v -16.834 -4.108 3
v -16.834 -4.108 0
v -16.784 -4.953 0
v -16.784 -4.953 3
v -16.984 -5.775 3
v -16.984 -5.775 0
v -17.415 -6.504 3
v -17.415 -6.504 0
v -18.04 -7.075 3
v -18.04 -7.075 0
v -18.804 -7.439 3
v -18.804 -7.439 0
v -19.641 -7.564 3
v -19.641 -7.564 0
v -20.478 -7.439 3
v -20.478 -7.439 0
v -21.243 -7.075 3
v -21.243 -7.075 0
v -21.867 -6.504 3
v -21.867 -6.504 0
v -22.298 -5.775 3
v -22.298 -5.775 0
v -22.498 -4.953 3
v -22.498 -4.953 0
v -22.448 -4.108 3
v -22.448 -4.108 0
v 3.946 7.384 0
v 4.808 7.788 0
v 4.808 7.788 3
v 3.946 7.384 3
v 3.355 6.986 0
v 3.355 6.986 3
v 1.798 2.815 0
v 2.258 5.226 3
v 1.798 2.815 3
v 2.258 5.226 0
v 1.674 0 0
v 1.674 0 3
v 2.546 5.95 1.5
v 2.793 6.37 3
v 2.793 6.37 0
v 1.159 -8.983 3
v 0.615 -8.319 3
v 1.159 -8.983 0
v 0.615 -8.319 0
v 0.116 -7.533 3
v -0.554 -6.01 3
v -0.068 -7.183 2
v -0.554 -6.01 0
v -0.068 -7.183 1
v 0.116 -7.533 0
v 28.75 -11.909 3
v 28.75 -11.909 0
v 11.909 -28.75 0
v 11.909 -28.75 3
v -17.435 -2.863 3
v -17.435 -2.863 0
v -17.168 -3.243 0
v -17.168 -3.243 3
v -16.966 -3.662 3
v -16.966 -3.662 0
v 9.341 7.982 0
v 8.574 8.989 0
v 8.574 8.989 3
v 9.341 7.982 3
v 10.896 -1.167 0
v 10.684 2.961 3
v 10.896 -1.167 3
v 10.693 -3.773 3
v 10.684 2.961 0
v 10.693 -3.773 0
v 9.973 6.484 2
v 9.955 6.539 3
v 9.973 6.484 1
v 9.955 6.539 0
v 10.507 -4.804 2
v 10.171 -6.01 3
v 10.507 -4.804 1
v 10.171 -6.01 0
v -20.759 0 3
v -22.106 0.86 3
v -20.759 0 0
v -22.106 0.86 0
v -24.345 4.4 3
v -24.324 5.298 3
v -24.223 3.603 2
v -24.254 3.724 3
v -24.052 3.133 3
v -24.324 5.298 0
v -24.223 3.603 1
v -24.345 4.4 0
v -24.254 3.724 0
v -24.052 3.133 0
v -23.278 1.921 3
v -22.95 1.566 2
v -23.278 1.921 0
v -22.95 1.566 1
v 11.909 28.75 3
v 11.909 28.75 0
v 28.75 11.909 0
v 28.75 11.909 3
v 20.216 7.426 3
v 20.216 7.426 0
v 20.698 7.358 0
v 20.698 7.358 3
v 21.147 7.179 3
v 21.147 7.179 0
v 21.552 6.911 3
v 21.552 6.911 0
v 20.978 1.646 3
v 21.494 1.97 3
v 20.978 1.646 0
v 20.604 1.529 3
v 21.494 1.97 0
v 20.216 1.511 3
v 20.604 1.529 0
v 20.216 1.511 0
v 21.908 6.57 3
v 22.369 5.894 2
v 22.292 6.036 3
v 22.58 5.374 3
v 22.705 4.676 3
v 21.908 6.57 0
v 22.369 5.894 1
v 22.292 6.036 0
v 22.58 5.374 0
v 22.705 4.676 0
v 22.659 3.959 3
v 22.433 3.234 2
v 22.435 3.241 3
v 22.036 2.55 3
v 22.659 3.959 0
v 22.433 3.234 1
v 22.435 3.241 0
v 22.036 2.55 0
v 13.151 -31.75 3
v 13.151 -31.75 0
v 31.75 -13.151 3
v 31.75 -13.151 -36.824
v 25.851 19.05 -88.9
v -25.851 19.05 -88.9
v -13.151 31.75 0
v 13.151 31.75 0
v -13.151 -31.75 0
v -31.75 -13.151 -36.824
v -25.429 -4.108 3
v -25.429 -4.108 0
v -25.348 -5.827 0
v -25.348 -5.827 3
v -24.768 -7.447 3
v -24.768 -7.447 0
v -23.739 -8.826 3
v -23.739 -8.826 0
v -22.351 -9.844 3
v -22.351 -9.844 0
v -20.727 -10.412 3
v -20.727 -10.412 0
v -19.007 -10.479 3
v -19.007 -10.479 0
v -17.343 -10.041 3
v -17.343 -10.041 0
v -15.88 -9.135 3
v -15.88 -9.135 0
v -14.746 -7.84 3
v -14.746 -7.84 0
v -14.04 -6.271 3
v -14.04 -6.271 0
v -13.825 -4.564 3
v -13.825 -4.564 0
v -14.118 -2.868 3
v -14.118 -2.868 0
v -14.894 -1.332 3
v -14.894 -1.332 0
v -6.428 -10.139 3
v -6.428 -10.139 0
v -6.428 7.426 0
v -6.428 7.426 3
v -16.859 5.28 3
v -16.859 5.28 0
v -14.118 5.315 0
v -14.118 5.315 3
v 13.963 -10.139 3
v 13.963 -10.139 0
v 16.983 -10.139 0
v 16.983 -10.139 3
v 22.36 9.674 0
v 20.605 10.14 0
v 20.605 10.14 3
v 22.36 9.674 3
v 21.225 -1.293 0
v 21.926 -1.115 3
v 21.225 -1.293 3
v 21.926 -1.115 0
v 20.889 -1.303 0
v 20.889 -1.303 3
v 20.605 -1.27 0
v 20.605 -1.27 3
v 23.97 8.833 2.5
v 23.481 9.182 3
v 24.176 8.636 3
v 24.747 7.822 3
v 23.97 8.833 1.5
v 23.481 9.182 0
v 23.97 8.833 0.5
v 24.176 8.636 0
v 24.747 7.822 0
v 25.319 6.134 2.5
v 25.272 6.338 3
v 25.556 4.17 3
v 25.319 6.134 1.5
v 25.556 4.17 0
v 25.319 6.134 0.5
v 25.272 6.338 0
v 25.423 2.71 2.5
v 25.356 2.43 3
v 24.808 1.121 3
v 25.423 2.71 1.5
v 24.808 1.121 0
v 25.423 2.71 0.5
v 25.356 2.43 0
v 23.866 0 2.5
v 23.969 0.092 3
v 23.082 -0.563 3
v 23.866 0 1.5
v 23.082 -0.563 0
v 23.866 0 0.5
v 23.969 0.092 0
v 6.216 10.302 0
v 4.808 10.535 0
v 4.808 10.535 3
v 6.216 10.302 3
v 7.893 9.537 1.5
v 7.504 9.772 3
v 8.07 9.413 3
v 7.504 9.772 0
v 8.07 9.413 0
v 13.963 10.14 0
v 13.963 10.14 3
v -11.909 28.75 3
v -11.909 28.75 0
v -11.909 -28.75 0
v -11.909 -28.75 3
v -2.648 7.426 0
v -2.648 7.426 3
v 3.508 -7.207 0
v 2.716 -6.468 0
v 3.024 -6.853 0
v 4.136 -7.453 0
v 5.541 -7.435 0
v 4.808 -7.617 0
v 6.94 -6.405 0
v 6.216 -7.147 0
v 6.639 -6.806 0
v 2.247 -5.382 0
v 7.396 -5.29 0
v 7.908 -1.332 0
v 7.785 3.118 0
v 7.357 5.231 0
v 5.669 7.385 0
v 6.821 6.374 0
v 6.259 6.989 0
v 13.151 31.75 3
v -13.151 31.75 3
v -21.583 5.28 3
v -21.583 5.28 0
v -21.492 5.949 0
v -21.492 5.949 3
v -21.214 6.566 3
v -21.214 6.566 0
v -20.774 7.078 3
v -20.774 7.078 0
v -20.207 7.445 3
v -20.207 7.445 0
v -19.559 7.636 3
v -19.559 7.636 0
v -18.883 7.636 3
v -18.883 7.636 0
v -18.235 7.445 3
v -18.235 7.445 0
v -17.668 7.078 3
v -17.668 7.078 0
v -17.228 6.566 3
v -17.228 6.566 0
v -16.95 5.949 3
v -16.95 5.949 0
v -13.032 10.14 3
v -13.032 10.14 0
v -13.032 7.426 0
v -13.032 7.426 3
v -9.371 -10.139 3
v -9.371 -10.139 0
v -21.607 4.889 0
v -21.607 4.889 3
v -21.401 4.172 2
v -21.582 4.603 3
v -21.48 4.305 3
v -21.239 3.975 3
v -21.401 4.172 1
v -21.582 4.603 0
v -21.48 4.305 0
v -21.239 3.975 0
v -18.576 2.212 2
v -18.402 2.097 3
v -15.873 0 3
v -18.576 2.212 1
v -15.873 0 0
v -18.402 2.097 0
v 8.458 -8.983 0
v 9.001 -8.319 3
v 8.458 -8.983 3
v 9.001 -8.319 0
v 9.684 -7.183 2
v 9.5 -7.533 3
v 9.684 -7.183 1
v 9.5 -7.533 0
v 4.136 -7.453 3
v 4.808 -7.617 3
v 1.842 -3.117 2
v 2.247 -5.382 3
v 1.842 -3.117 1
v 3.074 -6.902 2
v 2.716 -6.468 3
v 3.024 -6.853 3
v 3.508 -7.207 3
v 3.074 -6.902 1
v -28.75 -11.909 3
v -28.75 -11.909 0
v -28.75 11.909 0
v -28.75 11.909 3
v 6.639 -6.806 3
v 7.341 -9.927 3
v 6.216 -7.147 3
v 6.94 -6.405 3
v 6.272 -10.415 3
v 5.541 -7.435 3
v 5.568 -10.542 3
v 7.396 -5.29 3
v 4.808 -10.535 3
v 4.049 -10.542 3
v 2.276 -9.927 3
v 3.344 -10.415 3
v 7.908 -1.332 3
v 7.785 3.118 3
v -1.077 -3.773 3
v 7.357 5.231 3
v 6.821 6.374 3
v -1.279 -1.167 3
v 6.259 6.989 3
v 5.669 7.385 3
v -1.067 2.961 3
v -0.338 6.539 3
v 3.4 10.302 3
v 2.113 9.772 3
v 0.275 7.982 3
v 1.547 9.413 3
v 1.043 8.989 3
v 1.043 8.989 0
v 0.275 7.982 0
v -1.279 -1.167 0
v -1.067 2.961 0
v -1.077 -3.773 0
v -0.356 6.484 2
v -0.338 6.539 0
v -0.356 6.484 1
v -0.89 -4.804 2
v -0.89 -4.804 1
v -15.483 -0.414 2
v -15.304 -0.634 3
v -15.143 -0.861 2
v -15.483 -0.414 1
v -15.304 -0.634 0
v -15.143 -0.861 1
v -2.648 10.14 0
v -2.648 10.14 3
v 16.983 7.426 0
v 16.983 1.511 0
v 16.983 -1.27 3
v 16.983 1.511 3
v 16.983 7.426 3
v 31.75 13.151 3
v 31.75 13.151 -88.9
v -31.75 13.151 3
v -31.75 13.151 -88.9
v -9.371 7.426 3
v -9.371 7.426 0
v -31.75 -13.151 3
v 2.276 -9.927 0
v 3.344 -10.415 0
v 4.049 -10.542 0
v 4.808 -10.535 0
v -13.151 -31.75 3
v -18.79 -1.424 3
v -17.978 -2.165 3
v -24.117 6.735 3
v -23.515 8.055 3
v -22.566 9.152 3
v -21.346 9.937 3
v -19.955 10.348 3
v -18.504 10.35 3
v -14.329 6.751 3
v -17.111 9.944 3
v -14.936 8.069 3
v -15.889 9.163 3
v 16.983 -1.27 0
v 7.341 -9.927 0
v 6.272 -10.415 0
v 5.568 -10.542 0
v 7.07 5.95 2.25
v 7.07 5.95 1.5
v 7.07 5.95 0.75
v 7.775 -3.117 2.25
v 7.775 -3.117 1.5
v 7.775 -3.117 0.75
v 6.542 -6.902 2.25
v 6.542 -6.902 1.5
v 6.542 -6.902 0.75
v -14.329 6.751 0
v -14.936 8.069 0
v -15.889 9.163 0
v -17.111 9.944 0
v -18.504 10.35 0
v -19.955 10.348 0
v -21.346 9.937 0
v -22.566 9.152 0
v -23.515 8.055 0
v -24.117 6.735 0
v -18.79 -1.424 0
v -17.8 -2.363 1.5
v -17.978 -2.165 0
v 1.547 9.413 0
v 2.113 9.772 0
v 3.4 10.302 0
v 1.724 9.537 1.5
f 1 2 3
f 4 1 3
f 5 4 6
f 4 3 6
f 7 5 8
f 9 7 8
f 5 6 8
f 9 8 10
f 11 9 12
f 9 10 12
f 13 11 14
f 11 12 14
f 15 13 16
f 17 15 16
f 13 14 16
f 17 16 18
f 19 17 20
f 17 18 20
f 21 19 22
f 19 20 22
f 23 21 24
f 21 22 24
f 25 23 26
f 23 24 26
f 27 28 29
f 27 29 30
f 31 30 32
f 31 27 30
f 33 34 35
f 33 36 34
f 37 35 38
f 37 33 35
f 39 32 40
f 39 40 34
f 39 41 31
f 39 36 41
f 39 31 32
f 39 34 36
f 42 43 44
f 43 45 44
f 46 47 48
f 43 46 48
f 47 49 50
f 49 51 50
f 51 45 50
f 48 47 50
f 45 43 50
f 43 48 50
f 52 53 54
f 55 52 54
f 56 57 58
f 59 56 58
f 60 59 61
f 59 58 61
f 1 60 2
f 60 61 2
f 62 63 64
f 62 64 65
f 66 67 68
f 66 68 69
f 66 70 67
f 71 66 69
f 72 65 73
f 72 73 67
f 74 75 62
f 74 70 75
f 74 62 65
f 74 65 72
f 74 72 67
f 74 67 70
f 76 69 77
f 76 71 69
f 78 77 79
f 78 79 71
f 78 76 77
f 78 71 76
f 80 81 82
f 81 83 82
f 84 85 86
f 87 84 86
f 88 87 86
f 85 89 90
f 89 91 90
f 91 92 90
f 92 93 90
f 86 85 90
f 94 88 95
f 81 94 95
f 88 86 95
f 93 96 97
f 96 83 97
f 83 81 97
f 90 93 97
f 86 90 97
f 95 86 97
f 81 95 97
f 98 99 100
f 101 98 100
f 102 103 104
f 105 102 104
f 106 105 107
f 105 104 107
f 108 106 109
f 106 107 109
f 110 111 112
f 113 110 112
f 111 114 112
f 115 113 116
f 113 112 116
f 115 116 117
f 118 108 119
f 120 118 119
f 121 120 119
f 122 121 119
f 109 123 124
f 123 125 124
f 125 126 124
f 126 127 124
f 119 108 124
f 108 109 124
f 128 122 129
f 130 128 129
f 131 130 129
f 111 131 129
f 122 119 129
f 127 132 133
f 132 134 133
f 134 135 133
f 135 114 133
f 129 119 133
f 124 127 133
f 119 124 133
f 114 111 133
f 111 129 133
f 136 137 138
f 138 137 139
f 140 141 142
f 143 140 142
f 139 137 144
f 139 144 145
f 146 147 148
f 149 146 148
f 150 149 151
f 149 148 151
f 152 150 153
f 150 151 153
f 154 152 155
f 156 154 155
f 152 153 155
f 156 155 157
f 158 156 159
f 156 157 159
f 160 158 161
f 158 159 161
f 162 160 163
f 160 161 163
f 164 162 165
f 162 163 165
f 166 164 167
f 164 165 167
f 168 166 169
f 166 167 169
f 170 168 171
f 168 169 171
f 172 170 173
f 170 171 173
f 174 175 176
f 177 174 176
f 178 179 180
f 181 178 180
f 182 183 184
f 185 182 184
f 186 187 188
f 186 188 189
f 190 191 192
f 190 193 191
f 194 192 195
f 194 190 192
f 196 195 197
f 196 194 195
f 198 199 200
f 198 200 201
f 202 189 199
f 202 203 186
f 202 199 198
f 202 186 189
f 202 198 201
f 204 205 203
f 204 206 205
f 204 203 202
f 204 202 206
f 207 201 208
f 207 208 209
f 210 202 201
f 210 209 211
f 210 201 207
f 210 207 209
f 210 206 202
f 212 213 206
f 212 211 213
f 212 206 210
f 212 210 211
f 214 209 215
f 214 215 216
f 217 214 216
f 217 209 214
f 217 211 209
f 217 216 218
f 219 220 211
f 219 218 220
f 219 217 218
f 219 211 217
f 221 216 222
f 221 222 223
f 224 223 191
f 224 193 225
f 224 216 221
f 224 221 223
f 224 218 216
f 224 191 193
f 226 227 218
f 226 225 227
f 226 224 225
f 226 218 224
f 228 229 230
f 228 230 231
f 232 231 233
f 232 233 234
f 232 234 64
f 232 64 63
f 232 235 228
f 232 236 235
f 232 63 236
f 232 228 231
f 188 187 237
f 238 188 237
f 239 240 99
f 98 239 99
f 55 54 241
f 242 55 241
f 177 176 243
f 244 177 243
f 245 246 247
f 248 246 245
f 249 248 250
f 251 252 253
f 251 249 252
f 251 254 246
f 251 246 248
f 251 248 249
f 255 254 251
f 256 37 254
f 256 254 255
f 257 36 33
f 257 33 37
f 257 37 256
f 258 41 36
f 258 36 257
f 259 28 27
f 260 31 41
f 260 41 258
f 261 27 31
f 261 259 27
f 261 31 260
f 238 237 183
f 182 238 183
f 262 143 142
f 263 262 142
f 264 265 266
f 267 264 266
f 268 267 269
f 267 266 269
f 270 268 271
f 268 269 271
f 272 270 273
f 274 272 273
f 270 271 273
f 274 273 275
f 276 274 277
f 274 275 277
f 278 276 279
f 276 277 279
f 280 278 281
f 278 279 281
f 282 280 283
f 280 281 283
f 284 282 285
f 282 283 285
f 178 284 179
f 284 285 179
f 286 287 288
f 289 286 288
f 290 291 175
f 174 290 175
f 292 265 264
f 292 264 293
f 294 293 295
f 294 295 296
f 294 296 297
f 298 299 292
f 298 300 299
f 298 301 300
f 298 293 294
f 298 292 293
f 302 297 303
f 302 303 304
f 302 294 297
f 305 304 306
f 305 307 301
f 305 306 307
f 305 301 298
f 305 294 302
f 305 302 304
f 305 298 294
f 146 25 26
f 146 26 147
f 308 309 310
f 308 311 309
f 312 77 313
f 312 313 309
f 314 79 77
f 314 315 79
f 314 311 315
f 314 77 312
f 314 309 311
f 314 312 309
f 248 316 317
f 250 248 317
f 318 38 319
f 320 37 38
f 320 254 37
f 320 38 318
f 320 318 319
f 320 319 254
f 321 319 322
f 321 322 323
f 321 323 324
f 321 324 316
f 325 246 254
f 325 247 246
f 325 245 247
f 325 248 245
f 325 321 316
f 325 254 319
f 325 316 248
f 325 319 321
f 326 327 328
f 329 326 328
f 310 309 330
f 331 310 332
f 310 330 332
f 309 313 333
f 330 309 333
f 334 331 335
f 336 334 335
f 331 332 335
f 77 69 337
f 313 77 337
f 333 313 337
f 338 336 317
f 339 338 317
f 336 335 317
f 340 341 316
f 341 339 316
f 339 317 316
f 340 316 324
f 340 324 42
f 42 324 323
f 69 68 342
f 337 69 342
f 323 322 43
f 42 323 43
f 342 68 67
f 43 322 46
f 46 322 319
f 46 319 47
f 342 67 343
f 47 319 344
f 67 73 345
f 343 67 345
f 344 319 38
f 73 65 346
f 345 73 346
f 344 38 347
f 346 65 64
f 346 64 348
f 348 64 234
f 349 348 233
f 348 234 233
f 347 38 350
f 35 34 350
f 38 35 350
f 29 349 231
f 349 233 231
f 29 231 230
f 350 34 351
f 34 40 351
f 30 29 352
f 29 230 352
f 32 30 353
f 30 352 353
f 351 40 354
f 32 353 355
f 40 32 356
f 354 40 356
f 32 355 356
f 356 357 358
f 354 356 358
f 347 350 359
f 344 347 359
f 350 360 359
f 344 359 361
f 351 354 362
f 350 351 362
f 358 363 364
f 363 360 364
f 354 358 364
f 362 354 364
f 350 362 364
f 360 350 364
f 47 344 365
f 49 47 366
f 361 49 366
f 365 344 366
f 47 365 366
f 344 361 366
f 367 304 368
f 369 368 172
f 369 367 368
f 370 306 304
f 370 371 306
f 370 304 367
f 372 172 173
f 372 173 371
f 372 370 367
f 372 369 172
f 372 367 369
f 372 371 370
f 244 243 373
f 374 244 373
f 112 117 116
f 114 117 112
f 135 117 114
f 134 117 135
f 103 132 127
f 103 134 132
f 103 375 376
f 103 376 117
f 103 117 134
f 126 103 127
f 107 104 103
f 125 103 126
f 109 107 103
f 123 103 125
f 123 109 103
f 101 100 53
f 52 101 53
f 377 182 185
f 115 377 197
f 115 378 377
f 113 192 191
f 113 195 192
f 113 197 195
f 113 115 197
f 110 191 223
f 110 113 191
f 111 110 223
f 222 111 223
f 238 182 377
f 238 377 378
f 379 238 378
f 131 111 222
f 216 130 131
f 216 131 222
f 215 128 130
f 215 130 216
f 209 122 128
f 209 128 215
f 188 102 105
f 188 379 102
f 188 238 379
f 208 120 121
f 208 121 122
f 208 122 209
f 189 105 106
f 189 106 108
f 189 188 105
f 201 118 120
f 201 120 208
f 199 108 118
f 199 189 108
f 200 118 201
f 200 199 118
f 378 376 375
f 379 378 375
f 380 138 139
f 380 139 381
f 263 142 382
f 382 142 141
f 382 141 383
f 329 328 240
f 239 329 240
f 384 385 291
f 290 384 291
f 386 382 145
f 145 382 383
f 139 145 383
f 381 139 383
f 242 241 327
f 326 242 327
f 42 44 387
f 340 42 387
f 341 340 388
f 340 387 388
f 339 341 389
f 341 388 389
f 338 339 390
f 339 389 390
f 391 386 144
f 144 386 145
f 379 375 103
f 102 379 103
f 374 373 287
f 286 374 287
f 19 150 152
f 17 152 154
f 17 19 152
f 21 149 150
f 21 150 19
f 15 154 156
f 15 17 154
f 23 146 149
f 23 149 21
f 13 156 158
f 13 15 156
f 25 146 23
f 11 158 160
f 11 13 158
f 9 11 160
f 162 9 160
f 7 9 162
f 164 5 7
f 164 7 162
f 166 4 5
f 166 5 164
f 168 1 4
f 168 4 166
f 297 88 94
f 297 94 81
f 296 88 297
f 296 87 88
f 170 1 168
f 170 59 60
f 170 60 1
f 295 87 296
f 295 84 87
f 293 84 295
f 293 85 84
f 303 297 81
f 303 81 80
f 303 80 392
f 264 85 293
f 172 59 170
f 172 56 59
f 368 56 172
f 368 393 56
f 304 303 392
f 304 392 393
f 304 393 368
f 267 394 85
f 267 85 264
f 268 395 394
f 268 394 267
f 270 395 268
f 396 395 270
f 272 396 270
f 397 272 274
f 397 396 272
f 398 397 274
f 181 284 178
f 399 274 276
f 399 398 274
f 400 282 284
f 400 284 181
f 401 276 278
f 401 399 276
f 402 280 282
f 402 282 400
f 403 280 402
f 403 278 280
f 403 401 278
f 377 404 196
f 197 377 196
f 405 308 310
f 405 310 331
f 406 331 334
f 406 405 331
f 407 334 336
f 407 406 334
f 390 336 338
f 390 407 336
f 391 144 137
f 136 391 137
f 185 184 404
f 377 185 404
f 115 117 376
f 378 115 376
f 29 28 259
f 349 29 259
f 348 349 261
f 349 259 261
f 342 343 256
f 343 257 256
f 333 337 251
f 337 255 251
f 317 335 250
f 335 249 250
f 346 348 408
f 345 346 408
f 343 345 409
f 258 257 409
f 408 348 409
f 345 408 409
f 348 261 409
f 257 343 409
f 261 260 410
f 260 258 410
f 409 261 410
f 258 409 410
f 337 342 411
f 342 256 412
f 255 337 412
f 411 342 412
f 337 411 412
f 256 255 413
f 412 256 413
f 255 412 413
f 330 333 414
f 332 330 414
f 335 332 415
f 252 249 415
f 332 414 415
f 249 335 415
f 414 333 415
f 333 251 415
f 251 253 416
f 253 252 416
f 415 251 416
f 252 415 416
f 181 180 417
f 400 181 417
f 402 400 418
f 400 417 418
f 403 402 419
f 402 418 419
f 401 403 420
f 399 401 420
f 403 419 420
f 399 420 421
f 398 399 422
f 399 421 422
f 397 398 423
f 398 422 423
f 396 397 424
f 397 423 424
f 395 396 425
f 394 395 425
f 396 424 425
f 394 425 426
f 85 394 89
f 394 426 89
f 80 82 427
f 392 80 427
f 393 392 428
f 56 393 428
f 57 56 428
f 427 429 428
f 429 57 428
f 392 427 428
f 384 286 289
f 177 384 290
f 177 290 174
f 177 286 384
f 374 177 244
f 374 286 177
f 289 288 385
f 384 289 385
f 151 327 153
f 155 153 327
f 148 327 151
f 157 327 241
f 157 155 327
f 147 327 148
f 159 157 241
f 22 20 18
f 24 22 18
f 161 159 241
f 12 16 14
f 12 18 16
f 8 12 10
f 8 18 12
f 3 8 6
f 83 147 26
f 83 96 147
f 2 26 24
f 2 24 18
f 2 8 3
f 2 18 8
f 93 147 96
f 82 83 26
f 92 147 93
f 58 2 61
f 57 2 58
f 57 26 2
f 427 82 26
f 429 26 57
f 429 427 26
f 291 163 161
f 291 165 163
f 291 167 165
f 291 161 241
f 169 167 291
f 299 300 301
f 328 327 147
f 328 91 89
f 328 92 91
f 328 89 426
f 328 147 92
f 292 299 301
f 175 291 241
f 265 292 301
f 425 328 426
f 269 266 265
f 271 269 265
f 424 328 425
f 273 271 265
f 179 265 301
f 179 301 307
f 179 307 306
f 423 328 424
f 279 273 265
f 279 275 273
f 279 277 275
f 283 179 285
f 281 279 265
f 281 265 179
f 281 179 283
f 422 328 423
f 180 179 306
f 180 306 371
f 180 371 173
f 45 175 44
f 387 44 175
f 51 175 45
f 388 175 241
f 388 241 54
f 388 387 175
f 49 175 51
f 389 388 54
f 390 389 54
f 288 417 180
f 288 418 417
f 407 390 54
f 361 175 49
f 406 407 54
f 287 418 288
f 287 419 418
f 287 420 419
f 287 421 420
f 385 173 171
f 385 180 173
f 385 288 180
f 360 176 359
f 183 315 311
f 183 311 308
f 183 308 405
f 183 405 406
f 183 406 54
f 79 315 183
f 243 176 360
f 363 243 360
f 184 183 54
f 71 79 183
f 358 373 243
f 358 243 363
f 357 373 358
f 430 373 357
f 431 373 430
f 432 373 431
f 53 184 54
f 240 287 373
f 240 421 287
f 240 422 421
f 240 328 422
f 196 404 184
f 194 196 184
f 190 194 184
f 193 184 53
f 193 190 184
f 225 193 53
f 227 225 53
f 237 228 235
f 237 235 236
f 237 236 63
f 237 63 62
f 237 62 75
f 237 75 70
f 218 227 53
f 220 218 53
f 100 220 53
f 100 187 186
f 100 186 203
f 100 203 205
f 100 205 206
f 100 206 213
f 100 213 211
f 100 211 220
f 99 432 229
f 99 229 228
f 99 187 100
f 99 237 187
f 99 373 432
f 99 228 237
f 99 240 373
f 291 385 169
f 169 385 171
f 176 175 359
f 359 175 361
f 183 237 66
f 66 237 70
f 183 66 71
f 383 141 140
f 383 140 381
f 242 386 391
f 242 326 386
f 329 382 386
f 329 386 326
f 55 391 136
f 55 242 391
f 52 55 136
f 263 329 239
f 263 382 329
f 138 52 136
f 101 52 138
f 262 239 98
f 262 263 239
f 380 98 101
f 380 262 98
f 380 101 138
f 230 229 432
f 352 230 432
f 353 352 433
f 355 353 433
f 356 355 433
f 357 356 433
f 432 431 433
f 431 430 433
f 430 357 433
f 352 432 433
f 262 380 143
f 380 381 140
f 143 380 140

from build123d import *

# Parameters (mm, degrees)
F1_DEPTH   = 88.9
F1_FACE1_W = 26.3025612107
F1_FACE1_H = 88.9
F3_DEPTH   = 63.5
F5_DEPTH   = 3


# Not quite as in the source:
# - a feature names something its author has since deleted; it is built from what else it names


with BuildPart() as f1:
    # F0 (on Top) → F1 (new body)
    with BuildSketch(Plane.XY):
        Polygon((13.1512806053, 31.75), (-13.1512806053, 31.75), (-31.75, 13.1512806053), (-31.75, -13.1512806053), (-13.1512806053, -31.75), (13.1512806053, -31.75), (31.75, -13.1512806053), (31.75, 13.1512806053), align=None)
    extrude(amount=-F1_DEPTH)

    # F2 (on face) + F1_face1 (on face) → F3 (cut, through all)
    with BuildSketch(Plane(origin=(-31.75, 0, 0), x_dir=(0, -1, 0), z_dir=(-1, 0, 0))):
        Polygon((-19.05, -88.9), (-31.75, 0), (-31.75, -88.9), align=None)
        Polygon((31.75, -88.9), (31.75, 0), (13.1512806053, -36.823585695), (13.1512806053, -88.9), (14.6601814777, -88.9), align=None)
        Polygon((13.1512806053, -36.823585695), (-13.1512806053, -88.9), (-12.7, -88.9), (-6.35, -88.9), (0, -88.9), (8.3101814777, -88.9), (13.1512806053, -88.9), align=None)
    with BuildSketch(Plane(origin=(22.4506403027, -22.4506403027, -44.45), x_dir=(0.7071067812, 0.7071067812, 0), z_dir=(0.7071067812, -0.7071067812, 0))):
        Rectangle(F1_FACE1_W, F1_FACE1_H)
    extrude(amount=-F3_DEPTH, dir=(-1, 0, 0), mode=Mode.SUBTRACT)

    # F4 (on face) → F5 (join)
    with BuildSketch(Plane.XY):
        Polygon((13.1512806053, 31.75), (-13.1512806053, 31.75), (-31.75, 13.1512806053), (-31.75, -13.1512806053), (-13.1512806053, -31.75), (13.1512806053, -31.75), (31.75, -13.1512806053), (31.75, 13.1512806053), align=None)
        Polygon((-28.75, 10.7754608616), (-28.75, 11.9086399182), (-11.9086399182, 28.75), (11.9086399182, 28.75), (28.75, 11.9086399182), (28.75, 10.7754608616), (28.75, -10.7754608616), (28.75, -11.9086399182), (11.9086399182, -28.75), (-11.9086399182, -28.75), (-28.75, -11.9086399182), (-28.75, -10.7754608616), align=None, mode=Mode.SUBTRACT)
        with BuildLine():
            add(Edge.make_bspline(
                [(4.8083327711, 10.5354869738), (5.9249649259, 10.4834162819), (7.339599469, 10.0059956165), (8.3643975774, 9.1943899894), (8.5739761095, 8.9890481737)],
                knots=[0, 0, 0, 0, 0.0796423572, 0.1022272486, 0.1022272486, 0.1022272486, 0.1022272486], degree=3))
            add(Edge.make_bspline(
                [(4.8083327711, 10.5354869738), (3.6917006162, 10.4834162819), (2.2770660731, 10.0059956165), (1.2522679647, 9.1943899894), (1.0426894326, 8.9890481737)],
                knots=[0, 0, 0, 0, 0.0796423572, 0.1022272486, 0.1022272486, 0.1022272486, 0.1022272486], degree=3))
            add(Edge.make_bspline(
                [(-0.5542273499, -6.0097523046), (-0.6853048791, -5.4911473404), (-1.2029837025, -2.5307480598), (-1.3645767848, 4.0861219904), (0.1727738224, 7.9642019091), (1.0426894326, 8.9890481737)],
                knots=[0.6521796741, 0.6521796741, 0.6521796741, 0.6521796741, 0.683293281, 0.8153772216, 0.9015400151, 0.9015400151, 0.9015400151, 0.9015400151], degree=3))
            add(Edge.make_bspline(
                [(-0.5542273499, -6.0097523046), (-0.1219359708, -7.2774050993), (0.4855176774, -8.258165167), (1.158925978, -8.9826247772)],
                knots=[0.3319618275, 0.3319618275, 0.3319618275, 0.3319618275, 0.3946519049, 0.3946519049, 0.3946519049, 0.3946519049], degree=3))
            add(Edge.make_bspline(
                [(4.8083327711, -10.5354869738), (3.6099604652, -10.4237469099), (2.1738291685, -9.8473995471), (1.158925978, -8.9826247772)],
                knots=[0.4948947439, 0.4948947439, 0.4948947439, 0.4948947439, 0.5783031472, 0.5783031472, 0.5783031472, 0.5783031472], degree=3))
            add(Edge.make_bspline(
                [(4.8083327711, -10.5354869738), (6.0067050769, -10.4237469099), (7.4428363737, -9.8473995471), (8.4577395641, -8.9826247772)],
                knots=[0.4948947439, 0.4948947439, 0.4948947439, 0.4948947439, 0.5783031472, 0.5783031472, 0.5783031472, 0.5783031472], degree=3))
            add(Edge.make_bspline(
                [(10.170892892, -6.0097523046), (9.7386015129, -7.2774050993), (9.1311478647, -8.258165167), (8.4577395641, -8.9826247772)],
                knots=[0.3319618275, 0.3319618275, 0.3319618275, 0.3319618275, 0.3946519049, 0.3946519049, 0.3946519049, 0.3946519049], degree=3))
            add(Edge.make_bspline(
                [(10.170892892, -6.0097523046), (10.3019704212, -5.4911473404), (10.8196492446, -2.5307480598), (10.9812423269, 4.0861219904), (9.4438917197, 7.9642019091), (8.5739761095, 8.9890481737)],
                knots=[0.6521796741, 0.6521796741, 0.6521796741, 0.6521796741, 0.683293281, 0.8153772216, 0.9015400151, 0.9015400151, 0.9015400151, 0.9015400151], degree=3))
        make_face()
        with BuildLine():
            add(Edge.make_bspline(
                [(4.8083327711, 7.7876993455), (3.9534414496, 7.4218723248), (2.0820207972, 6.6210497822), (1.660966503, 2.272494011), (1.6738338819, 0)],
                knots=[0, 0, 0, 0, 0.2110894815, 0.4620905666, 0.4620905666, 0.4620905666, 0.4620905666], degree=3))
            add(Edge.make_bspline(
                [(4.8083327711, 7.7876993455), (5.6632240926, 7.4218723248), (8.028214212, 6.4098404237), (8.0974839635, -3.0892679636), (6.9910117402, -7.135194286), (5.4397234852, -7.47767614), (4.8083327711, -7.617069874)],
                knots=[0, 0, 0, 0, 0.2110894815, 0.5839625756, 0.8306683715, 1, 1, 1, 1], degree=3))
            add(Edge.make_bspline(
                [(1.6738338819, 0), (1.6800815574, -1.1033952726), (1.8712186248, -4.3765266238), (2.6256538019, -7.135194286), (4.1769420569, -7.47767614), (4.8083327711, -7.617069874)],
                knots=[0.4620905666, 0.4620905666, 0.4620905666, 0.4620905666, 0.5839625756, 0.8306683715, 1, 1, 1, 1], degree=3))
        make_face(mode=Mode.SUBTRACT)
        with BuildLine():
            Line((20.6052474678, 10.1401684806), (13.9625072479, 10.1401684806))
            Line((13.9625072479, 10.1401684806), (13.9625072479, -10.1387687027))
            Line((13.9625072479, -10.1387687027), (16.9827528298, -10.1387687027))
            Line((16.9827528298, -10.1387687027), (16.9827528298, -1.2698972132))
            Line((16.9827528298, -1.2698972132), (20.6052474678, -1.2698972132))
            add(Edge.make_bspline(
                [(20.6052474678, 10.1401684806), (21.8779731079, 9.8412745125), (24.3142685907, 9.2691213309), (25.4822457744, 6.1351724103), (25.736421693, 2.6562033682), (24.2123159942, -0.1800935194), (21.4538469207, -1.3948664952), (20.8225355964, -1.3018962221), (20.6052474678, -1.2698972132)],
                knots=[0, 0, 0, 0, 0.1937641782, 0.3709100981, 0.5596905933, 0.7399766879, 0.9105037773, 1, 1, 1, 1], degree=3))
        make_face()
        with BuildLine():
            Line((20.2160011977, 1.5110635431), (16.9827528298, 1.5110635431))
            Line((16.9827528298, 1.5110635431), (16.9827528298, 7.4263564311))
            Line((16.9827528298, 7.4263564311), (20.2160011977, 7.4263564311))
            add(Edge.make_bspline(
                [(20.2160011977, 7.4263564311), (21.1544893682, 7.4114310555), (22.7486394765, 6.0097179724), (22.8736105917, 3.1708769977), (21.149745211, 1.4233636903), (20.2160011977, 1.5110635431)],
                knots=[0, 0, 0, 0, 0.3295814167, 0.6602854532, 1, 1, 1, 1], degree=3))
        make_face(mode=Mode.SUBTRACT)
        with BuildLine():
            ThreePointArc((-16.8338958174, -4.1077076457), (-19.6410734206, -7.564034438), (-22.4482510239, -4.1077076457))
            Line((-22.4482510239, -4.1077076457), (-25.4293251783, -4.1077076457))
            ThreePointArc((-25.4293251783, -4.1077076457), (-18.1588622297, -10.3219857216), (-14.8939756829, -1.3321359272))
            add(Edge.make_bspline(
                [(-15.8727969974, 0), (-15.4709741473, -0.3938739537), (-15.0835029781, -0.853099511), (-14.8939756829, -1.3321359272)],
                knots=[0, 0, 0, 0, 1.6530811518, 1.6530811518, 1.6530811518, 1.6530811518], degree=3))
            add(Edge.make_bspline(
                [(-21.5829703957, 5.279887002), (-21.6180322262, 4.9093177243), (-21.7144690872, 3.8900743649), (-18.3106174987, 2.2689761454), (-16.6874966749, 0.7582732743), (-15.8727969974, 0)],
                knots=[0, 0, 0, 0, 0.221505784, 0.6092472123, 1, 1, 1, 1], degree=3))
            ThreePointArc((-21.5829703957, 5.279887002), (-19.2209649831, 7.6604824432), (-16.8589595705, 5.279887002))
            Line((-16.8589595705, 5.279887002), (-14.1183091328, 5.3153838962))
            ThreePointArc((-14.1183091328, 5.3153838962), (-19.22945472, 10.4010814839), (-24.3236490835, 5.298404446))
            add(Edge.make_bspline(
                [(-24.3236490835, 5.298404446), (-24.3557528234, 4.7439102233), (-24.4260352796, 3.5299950823), (-23.0471913533, 1.3752329572), (-21.5360686477, 0.4670374949), (-20.7589771599, 0)],
                knots=[0, 0, 0, 0, 0.2900044831, 0.6348863858, 1, 1, 1, 1], degree=3))
            add(Edge.make_bspline(
                [(-20.7589771599, 0), (-19.6156120227, -0.7838167648), (-18.2336909625, -1.7311719529), (-17.5404152252, -2.6957135463), (-17.4353591755, -2.8625837034)],
                knots=[0, 0, 0, 0, 0.5794694701, 0.7003721194, 0.7003721194, 0.7003721194, 0.7003721194], degree=3))
            ThreePointArc((-17.4353591755, -2.8625837034), (-17.0584672604, -3.448356091), (-16.8338958174, -4.1077076457))
        make_face()
        Polygon((-9.3714222312, 7.4263564311), (-9.3714222312, -10.1387687027), (-6.427643355, -10.1387687027), (-6.427643355, 7.4263564311), (-2.6484197006, 7.4263564311), (-2.6484197006, 10.1401684806), (-6.427643355, 10.1401684806), (-9.3714222312, 10.1401684806), (-13.0321141332, 10.1401684806), (-13.0321141332, 7.4263564311), align=None)
        with BuildLine():
            add(Edge.make_bspline(
                [(-0.5542273499, -6.0097523046), (-0.6853048791, -5.4911473404), (-1.2029837025, -2.5307480598), (-1.3645767848, 4.0861219904), (0.1727738224, 7.9642019091), (1.0426894326, 8.9890481737)],
                knots=[0.6521796741, 0.6521796741, 0.6521796741, 0.6521796741, 0.683293281, 0.8153772216, 0.9015400151, 0.9015400151, 0.9015400151, 0.9015400151], degree=3))
            add(Edge.make_bspline(
                [(1.0426894326, 8.9890481737), (0.4633846395, 8.4214542659), (-1.0609269861, 5.8291860693), (-1.6974790085, -2.0230291515), (-0.6825603591, -5.6334281267), (-0.5542273499, -6.0097523046)],
                knots=[0.1022272486, 0.1022272486, 0.1022272486, 0.1022272486, 0.1646550922, 0.3133512175, 0.3319618275, 0.3319618275, 0.3319618275, 0.3319618275], degree=3))
        make_face()
        with BuildLine():
            add(Edge.make_bspline(
                [(8.5739761095, 8.9890481737), (9.1532809026, 8.4214542659), (10.6775925282, 5.8291860693), (11.3141445506, -2.0230291515), (10.2992259012, -5.6334281267), (10.170892892, -6.0097523046)],
                knots=[0.1022272486, 0.1022272486, 0.1022272486, 0.1022272486, 0.1646550922, 0.3133512175, 0.3319618275, 0.3319618275, 0.3319618275, 0.3319618275], degree=3))
            add(Edge.make_bspline(
                [(10.170892892, -6.0097523046), (10.3019704212, -5.4911473404), (10.8196492446, -2.5307480598), (10.9812423269, 4.0861219904), (9.4438917197, 7.9642019091), (8.5739761095, 8.9890481737)],
                knots=[0.6521796741, 0.6521796741, 0.6521796741, 0.6521796741, 0.683293281, 0.8153772216, 0.9015400151, 0.9015400151, 0.9015400151, 0.9015400151], degree=3))
        make_face()
        with BuildLine():
            add(Edge.make_bspline(
                [(4.8083327711, -10.5354869738), (3.6099604652, -10.4237469099), (2.1738291685, -9.8473995471), (1.158925978, -8.9826247772)],
                knots=[0.4948947439, 0.4948947439, 0.4948947439, 0.4948947439, 0.5783031472, 0.5783031472, 0.5783031472, 0.5783031472], degree=3))
            add(Edge.make_bspline(
                [(1.158925978, -8.9826247772), (1.4164965069, -9.2597218145), (2.5336297837, -10.2613938856), (3.712598623, -10.6376567279), (4.8083327711, -10.5354869738)],
                knots=[0.3946519049, 0.3946519049, 0.3946519049, 0.3946519049, 0.4186301011, 0.4948947439, 0.4948947439, 0.4948947439, 0.4948947439], degree=3))
        make_face()
        with BuildLine():
            add(Edge.make_bspline(
                [(8.4577395641, -8.9826247772), (8.2001690352, -9.2597218145), (7.0830357584, -10.2613938856), (5.9040669191, -10.6376567279), (4.8083327711, -10.5354869738)],
                knots=[0.3946519049, 0.3946519049, 0.3946519049, 0.3946519049, 0.4186301011, 0.4948947439, 0.4948947439, 0.4948947439, 0.4948947439], degree=3))
            add(Edge.make_bspline(
                [(4.8083327711, -10.5354869738), (6.0067050769, -10.4237469099), (7.4428363737, -9.8473995471), (8.4577395641, -8.9826247772)],
                knots=[0.4948947439, 0.4948947439, 0.4948947439, 0.4948947439, 0.5783031472, 0.5783031472, 0.5783031472, 0.5783031472], degree=3))
        make_face()
    extrude(amount=F5_DEPTH)


solid = f1.part
